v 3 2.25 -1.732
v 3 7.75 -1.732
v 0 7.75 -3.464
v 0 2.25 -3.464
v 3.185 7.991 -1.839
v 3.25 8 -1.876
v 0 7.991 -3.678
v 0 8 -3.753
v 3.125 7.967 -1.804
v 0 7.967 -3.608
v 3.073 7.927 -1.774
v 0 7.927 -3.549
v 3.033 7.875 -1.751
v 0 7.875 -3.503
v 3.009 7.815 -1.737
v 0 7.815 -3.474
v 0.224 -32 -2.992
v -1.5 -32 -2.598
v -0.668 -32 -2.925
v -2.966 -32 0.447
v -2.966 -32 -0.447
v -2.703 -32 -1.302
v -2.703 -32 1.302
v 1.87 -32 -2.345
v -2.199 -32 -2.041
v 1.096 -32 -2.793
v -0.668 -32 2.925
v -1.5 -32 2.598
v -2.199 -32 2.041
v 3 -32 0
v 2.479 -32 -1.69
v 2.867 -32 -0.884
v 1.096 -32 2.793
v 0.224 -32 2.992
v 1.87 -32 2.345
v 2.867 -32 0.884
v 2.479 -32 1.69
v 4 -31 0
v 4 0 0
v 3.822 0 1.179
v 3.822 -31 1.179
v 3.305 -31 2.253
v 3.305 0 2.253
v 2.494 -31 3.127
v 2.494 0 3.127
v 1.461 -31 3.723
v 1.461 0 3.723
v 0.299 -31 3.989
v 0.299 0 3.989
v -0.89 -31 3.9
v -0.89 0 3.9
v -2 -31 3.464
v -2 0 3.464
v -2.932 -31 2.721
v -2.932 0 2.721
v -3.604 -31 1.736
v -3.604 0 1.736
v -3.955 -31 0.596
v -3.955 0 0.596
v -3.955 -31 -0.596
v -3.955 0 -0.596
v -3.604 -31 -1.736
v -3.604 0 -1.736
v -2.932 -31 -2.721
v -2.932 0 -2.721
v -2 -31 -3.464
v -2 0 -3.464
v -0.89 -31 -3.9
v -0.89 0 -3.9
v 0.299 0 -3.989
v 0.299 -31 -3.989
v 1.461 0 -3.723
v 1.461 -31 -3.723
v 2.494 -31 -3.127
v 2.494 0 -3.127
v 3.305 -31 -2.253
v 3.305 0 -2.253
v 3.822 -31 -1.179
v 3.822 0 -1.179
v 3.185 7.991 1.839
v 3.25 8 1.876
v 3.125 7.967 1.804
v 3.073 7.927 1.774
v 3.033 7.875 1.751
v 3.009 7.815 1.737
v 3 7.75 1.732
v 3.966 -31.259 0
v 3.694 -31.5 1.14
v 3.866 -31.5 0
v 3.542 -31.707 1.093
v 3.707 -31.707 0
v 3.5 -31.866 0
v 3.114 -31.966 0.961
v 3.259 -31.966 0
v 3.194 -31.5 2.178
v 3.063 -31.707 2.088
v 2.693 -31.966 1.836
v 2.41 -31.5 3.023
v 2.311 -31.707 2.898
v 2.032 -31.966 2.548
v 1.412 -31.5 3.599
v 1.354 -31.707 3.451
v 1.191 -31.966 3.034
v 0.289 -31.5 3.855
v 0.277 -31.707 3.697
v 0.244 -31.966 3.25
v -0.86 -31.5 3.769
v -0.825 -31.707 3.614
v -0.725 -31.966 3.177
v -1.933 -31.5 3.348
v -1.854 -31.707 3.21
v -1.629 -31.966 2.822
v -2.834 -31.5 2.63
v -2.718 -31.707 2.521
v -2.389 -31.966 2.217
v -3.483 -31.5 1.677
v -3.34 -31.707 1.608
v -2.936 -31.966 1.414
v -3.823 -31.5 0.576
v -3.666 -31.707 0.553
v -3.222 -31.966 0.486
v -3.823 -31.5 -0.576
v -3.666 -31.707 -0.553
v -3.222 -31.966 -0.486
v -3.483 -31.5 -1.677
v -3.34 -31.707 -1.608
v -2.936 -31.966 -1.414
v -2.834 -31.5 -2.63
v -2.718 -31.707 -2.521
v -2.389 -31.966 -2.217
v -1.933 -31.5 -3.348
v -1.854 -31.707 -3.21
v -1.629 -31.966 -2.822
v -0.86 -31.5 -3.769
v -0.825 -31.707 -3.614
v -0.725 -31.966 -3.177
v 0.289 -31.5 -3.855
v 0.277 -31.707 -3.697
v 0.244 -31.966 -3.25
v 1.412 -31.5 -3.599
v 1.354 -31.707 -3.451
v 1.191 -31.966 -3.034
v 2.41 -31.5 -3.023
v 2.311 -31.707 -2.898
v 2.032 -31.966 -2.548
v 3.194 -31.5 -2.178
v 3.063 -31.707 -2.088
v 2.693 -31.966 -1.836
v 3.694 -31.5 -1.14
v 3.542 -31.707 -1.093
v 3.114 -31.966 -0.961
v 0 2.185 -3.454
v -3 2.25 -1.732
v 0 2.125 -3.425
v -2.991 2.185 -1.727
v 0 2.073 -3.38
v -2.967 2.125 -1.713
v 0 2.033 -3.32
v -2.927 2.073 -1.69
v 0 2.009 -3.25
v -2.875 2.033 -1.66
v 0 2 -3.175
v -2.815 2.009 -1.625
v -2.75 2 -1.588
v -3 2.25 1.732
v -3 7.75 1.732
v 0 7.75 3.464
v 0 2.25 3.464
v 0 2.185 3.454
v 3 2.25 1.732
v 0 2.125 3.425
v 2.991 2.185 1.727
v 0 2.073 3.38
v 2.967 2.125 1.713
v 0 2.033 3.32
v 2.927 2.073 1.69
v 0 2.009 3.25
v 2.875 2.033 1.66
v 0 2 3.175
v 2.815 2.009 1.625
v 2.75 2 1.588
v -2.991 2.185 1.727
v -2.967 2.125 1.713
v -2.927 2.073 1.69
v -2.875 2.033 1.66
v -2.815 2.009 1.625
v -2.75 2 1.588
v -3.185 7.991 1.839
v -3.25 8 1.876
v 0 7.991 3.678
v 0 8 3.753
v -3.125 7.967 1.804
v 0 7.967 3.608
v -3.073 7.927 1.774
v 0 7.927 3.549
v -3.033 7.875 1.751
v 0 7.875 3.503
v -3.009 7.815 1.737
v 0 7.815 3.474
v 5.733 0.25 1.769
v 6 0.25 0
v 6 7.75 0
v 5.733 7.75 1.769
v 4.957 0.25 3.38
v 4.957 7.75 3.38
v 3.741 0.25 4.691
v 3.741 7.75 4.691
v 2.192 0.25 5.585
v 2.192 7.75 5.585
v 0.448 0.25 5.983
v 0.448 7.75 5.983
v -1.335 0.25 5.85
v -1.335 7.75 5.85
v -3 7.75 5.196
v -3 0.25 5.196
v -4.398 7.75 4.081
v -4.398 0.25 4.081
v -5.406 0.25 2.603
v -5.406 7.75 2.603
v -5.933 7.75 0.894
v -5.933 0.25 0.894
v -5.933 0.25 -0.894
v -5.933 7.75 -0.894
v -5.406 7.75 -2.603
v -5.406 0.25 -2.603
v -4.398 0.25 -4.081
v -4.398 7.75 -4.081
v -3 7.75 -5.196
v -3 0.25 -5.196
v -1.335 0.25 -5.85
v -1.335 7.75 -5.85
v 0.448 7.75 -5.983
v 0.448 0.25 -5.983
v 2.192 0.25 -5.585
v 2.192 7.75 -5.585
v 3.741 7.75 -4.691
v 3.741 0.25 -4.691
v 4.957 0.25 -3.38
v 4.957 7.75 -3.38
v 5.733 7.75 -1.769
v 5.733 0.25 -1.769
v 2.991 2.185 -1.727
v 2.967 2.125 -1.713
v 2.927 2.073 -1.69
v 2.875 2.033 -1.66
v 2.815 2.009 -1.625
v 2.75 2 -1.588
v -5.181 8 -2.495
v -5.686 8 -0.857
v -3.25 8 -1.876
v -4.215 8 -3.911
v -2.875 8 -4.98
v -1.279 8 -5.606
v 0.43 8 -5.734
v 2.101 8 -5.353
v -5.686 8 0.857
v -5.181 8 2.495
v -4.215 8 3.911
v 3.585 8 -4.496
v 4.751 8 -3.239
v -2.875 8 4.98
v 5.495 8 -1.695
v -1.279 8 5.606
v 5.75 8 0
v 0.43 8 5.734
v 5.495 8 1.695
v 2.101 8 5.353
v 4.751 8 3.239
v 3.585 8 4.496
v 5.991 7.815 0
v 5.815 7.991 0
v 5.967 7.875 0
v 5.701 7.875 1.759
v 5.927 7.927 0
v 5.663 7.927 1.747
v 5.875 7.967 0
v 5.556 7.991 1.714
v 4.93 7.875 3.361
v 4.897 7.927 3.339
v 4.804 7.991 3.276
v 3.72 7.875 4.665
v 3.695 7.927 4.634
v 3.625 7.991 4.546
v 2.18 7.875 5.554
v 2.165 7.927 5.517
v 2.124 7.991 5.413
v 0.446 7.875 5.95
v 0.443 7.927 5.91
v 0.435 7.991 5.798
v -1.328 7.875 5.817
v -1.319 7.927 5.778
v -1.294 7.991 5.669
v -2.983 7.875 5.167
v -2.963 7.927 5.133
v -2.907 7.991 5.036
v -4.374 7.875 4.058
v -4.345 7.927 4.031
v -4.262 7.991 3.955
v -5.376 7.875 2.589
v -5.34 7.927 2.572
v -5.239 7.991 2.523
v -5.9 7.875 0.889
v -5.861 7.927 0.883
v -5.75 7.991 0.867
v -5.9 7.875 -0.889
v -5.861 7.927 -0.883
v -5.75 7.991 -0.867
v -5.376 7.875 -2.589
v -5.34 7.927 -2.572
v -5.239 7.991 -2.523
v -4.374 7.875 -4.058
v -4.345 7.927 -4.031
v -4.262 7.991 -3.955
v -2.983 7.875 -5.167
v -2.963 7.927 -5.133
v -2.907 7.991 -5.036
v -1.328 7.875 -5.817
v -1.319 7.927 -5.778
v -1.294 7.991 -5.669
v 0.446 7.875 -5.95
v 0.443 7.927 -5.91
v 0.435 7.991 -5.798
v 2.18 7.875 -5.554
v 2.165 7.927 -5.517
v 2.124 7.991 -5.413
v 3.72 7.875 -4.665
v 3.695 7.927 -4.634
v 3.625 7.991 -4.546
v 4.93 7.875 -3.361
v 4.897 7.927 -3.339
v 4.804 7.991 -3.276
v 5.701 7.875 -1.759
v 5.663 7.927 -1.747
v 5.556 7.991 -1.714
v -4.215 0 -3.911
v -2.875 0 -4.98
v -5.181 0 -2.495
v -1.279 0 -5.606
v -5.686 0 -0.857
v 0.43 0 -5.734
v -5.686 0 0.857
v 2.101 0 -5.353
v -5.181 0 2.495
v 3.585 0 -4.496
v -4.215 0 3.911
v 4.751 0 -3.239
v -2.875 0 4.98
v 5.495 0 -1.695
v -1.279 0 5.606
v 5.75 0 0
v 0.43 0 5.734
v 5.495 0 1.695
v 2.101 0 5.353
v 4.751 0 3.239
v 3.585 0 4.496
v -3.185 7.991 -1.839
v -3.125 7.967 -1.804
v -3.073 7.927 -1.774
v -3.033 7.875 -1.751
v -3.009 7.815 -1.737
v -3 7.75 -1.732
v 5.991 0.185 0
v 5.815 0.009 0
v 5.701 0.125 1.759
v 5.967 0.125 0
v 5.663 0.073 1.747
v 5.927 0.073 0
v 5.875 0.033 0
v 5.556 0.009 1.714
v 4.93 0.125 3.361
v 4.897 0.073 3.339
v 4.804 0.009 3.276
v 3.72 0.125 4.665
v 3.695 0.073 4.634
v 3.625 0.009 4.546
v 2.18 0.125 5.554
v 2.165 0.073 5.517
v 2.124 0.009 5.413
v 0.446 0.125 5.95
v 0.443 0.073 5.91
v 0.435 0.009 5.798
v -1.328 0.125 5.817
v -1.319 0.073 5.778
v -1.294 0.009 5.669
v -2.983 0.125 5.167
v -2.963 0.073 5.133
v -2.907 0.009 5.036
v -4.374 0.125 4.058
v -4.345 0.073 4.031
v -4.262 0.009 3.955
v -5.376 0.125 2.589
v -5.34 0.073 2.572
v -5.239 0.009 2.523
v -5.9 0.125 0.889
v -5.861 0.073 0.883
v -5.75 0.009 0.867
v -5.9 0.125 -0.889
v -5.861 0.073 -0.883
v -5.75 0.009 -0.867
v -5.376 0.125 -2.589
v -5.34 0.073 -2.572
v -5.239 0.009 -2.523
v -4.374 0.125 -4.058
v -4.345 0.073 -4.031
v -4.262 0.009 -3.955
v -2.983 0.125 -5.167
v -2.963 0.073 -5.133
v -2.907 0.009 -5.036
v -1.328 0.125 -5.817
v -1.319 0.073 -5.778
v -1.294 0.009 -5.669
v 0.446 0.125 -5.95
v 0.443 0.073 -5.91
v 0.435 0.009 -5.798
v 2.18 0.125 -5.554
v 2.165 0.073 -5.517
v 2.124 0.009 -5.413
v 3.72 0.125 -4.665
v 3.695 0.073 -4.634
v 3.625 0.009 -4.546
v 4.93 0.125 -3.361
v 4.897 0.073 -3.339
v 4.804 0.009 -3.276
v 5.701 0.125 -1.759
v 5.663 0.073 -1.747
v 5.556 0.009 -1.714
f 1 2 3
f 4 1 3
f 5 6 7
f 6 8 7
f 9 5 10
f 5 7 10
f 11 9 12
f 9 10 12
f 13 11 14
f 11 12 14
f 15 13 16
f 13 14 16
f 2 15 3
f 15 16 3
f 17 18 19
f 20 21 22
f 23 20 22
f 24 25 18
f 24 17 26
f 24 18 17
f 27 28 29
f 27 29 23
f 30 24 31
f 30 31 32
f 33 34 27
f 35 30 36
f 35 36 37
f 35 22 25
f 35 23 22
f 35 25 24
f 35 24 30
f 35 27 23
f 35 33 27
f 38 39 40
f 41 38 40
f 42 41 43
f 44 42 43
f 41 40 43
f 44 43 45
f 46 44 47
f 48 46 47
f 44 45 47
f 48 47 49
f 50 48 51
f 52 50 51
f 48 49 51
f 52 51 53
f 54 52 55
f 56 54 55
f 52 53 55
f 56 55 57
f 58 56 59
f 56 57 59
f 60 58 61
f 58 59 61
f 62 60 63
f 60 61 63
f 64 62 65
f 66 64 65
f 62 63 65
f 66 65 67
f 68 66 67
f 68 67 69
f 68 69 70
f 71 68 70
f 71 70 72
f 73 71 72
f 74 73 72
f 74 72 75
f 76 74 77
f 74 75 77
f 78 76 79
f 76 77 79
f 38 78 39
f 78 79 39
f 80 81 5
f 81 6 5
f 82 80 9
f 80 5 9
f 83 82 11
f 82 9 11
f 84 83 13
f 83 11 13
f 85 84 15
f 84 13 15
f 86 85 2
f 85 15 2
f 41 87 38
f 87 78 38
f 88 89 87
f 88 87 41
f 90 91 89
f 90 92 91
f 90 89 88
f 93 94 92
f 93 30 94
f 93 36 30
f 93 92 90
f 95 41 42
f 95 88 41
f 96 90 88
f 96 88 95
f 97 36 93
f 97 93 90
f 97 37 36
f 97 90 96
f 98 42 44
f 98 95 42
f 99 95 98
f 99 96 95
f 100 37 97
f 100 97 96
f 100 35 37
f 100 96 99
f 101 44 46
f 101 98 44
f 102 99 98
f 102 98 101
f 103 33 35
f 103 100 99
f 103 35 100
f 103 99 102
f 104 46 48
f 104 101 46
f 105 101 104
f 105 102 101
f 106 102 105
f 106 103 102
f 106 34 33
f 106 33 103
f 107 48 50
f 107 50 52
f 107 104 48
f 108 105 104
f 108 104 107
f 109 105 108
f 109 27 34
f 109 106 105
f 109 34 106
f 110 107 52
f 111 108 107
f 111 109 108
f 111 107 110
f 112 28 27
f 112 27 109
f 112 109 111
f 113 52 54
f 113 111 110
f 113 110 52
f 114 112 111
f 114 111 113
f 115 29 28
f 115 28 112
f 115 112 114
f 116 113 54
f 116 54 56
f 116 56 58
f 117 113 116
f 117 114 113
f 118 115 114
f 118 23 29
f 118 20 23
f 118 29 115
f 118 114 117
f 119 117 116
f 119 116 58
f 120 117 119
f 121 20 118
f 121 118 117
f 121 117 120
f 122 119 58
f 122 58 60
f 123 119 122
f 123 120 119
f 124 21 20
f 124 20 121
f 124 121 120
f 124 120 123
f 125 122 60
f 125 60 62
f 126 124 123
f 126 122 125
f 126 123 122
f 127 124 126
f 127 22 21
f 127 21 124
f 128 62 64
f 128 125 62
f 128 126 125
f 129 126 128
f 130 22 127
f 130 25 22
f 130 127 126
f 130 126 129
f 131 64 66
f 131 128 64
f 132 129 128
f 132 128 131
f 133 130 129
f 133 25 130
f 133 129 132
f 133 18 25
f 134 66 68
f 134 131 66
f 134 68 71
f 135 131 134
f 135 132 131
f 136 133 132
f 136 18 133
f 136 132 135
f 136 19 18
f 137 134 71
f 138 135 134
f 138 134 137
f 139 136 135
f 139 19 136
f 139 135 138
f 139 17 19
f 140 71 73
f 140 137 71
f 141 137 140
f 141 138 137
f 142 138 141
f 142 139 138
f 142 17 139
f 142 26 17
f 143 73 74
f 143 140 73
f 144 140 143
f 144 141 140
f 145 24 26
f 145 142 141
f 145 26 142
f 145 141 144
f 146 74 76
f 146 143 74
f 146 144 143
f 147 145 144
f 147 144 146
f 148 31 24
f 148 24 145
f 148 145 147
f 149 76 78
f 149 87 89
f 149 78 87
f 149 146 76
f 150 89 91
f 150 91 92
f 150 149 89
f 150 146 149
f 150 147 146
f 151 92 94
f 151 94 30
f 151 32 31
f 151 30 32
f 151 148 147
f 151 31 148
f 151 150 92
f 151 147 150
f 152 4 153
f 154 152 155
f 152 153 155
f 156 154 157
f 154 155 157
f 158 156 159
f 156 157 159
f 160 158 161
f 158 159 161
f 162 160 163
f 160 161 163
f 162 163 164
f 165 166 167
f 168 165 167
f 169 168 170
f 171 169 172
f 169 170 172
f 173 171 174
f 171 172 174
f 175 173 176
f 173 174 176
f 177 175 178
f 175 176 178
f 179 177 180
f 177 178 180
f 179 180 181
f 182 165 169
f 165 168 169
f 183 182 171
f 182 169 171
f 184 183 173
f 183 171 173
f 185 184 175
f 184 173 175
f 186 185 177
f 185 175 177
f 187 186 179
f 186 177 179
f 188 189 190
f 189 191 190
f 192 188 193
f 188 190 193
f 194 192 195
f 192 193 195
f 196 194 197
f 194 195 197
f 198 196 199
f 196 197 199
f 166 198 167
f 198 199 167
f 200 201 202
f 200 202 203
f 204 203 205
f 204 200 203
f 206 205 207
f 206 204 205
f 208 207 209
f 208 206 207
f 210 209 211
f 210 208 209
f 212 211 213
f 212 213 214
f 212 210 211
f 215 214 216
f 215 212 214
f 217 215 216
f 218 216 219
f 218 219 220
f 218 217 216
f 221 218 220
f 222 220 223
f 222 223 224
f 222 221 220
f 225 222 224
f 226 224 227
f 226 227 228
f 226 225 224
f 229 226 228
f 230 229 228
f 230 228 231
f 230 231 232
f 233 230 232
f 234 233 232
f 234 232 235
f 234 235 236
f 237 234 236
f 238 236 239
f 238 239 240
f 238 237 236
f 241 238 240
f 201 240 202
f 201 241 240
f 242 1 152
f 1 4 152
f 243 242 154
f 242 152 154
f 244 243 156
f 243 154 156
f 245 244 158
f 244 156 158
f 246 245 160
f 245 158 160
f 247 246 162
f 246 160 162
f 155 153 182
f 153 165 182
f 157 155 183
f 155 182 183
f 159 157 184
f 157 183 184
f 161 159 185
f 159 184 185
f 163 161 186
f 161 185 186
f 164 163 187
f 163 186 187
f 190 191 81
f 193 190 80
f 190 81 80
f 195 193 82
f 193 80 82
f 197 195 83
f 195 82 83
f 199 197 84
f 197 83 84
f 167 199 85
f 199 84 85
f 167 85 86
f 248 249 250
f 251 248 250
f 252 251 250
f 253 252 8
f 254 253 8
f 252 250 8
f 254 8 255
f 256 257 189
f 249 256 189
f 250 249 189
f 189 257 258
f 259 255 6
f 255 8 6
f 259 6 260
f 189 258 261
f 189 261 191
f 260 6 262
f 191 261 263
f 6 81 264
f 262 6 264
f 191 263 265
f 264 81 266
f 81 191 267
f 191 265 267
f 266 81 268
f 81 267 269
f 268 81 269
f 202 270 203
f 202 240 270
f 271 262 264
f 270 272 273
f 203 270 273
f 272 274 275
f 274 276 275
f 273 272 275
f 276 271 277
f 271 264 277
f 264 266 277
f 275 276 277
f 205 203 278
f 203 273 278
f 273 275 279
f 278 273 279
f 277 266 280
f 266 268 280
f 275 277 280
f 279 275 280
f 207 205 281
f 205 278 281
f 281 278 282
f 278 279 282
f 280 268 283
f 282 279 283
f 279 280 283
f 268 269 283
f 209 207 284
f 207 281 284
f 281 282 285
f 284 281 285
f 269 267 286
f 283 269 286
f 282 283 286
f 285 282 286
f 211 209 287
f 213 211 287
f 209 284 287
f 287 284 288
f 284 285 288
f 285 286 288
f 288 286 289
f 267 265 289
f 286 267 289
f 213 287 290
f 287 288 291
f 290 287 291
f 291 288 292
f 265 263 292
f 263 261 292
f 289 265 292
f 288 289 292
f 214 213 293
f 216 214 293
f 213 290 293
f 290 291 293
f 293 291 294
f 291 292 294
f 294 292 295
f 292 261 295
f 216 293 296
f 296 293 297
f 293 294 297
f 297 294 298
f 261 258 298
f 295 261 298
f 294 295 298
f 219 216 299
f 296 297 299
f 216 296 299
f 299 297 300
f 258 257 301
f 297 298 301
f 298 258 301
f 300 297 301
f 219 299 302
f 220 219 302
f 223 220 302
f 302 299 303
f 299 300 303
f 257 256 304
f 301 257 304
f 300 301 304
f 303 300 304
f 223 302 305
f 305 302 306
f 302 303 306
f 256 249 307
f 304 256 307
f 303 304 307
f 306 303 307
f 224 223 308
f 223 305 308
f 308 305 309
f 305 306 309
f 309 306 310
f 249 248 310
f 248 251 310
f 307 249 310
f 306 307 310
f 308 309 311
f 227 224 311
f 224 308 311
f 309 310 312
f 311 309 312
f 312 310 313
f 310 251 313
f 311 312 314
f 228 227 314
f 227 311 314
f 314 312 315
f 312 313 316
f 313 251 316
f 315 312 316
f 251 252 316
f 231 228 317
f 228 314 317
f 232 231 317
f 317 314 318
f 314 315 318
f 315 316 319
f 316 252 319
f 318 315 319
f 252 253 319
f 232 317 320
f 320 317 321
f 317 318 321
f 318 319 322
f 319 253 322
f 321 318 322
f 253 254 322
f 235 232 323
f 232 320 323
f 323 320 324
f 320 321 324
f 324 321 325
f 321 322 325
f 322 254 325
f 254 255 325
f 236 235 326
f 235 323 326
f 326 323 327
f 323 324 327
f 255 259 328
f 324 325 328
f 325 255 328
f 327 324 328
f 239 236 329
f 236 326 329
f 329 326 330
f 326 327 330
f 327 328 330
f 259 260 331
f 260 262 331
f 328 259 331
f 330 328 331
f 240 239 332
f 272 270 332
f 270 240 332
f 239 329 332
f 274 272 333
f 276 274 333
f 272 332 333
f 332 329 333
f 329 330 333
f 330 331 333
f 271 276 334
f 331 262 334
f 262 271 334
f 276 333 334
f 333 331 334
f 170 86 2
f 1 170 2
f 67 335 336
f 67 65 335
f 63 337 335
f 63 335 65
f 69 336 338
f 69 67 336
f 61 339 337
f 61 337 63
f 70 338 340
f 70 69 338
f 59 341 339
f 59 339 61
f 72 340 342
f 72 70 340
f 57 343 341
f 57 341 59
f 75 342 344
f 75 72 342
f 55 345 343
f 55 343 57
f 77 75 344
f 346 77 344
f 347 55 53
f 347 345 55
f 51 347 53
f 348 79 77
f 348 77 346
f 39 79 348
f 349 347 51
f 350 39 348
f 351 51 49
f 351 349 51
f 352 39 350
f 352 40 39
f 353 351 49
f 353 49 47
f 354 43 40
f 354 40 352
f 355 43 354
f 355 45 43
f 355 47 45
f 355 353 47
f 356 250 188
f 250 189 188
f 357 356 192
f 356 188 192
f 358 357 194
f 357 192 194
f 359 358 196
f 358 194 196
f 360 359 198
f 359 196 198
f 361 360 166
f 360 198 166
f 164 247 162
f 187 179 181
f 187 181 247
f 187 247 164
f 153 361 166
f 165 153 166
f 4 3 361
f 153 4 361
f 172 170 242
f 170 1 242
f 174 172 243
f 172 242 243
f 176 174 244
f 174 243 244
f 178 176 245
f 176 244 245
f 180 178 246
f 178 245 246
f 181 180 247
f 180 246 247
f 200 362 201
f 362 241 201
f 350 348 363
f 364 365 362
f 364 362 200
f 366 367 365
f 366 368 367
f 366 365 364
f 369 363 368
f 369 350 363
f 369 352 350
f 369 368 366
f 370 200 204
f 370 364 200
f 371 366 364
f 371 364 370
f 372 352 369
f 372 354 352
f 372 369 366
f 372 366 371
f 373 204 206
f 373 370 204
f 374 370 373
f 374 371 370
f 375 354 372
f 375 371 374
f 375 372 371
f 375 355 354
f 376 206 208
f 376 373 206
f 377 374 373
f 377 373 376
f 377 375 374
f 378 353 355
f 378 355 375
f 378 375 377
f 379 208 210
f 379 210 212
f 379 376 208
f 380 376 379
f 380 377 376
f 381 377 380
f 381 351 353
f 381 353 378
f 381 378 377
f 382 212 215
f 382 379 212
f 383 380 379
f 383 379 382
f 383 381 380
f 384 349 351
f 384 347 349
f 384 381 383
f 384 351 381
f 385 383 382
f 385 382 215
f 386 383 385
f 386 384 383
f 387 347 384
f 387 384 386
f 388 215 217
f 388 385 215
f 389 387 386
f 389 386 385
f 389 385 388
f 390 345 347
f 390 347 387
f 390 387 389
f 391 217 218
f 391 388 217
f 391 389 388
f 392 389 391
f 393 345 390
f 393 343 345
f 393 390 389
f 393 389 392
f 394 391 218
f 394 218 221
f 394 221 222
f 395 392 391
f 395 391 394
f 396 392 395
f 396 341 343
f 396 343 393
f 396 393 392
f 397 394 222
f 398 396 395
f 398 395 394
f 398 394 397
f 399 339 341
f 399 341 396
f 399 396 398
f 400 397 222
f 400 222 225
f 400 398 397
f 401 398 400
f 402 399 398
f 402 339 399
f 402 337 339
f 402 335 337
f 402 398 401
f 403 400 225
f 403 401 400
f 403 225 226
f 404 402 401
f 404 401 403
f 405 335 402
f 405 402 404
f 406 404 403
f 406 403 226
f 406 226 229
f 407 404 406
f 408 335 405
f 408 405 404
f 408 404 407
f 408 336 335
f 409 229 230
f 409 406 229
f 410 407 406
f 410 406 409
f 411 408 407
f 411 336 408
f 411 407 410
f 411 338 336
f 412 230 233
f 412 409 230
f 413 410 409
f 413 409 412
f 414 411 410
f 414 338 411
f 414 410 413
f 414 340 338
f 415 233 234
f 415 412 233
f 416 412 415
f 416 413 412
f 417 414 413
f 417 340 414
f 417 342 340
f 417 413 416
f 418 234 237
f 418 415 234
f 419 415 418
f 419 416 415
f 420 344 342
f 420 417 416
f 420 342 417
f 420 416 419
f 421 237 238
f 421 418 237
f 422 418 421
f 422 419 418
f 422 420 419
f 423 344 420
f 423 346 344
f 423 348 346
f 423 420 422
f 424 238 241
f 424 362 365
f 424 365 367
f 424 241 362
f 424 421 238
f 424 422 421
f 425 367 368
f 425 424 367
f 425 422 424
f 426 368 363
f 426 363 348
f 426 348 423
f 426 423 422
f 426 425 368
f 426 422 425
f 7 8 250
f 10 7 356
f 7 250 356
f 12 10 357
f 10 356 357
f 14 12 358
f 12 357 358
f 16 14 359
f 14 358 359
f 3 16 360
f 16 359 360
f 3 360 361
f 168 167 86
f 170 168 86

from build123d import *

# Parameters (mm, degrees)
F0_R     = 4
F1_DEPTH = 32
F0_R_2   = 6
F2_DEPTH = 8
F4_DEPTH = 6
F5_R     = 0.25
F6_R     = 1


with BuildPart() as f1:
    # F0 (on Front) → F1 (new body)
    with BuildSketch(Plane.XZ):
        Circle(F0_R)
    extrude(amount=F1_DEPTH)

    # F0 (on Front) → F2 (join)
    with BuildSketch(Plane.XZ):
        Circle(F0_R_2)
        Circle(F0_R, mode=Mode.SUBTRACT)
        Circle(F0_R)
    extrude(amount=-F2_DEPTH)

    # F3 (on face) → F4 (cut)
    with BuildSketch(Plane(origin=(0, 8, 0), x_dir=(-1, 0, 0), z_dir=(0, 1, 0))):
        Polygon((-3, 1.732051), (-3, -1.732051), (0, -3.464102), (3, -1.732051), (3, 1.732051), (0, 3.464102), align=None)
    extrude(amount=-F4_DEPTH, mode=Mode.SUBTRACT)

    # F5
    f5_edges = [f1.edges().sort_by_distance(p)[0] for p in [
        (1.5, 8, -2.598076),
        (-1.5, 8, -2.598076),
        (-3, 8, 0),
        (-1.5, 8, 2.598076),
        (1.5, 8, 2.598076),
        (3, 8, 0),
        (-6, 8, 0),
        (1.5, 2, -2.598076),
        (-1.5, 2, -2.598076),
        (3, 2, 0),
        (1.5, 2, 2.598076),
        (-1.5, 2, 2.598076),
        (-3, 2, 0),
        (-6, 0, 0),
    ]]
    fillet(f5_edges, radius=F5_R)

    # F6
    f6_edges = [f1.edges().sort_by_distance(p)[0] for p in [
        (-4, -32, 0),
    ]]
    fillet(f6_edges, radius=F6_R)


solid = f1.part
